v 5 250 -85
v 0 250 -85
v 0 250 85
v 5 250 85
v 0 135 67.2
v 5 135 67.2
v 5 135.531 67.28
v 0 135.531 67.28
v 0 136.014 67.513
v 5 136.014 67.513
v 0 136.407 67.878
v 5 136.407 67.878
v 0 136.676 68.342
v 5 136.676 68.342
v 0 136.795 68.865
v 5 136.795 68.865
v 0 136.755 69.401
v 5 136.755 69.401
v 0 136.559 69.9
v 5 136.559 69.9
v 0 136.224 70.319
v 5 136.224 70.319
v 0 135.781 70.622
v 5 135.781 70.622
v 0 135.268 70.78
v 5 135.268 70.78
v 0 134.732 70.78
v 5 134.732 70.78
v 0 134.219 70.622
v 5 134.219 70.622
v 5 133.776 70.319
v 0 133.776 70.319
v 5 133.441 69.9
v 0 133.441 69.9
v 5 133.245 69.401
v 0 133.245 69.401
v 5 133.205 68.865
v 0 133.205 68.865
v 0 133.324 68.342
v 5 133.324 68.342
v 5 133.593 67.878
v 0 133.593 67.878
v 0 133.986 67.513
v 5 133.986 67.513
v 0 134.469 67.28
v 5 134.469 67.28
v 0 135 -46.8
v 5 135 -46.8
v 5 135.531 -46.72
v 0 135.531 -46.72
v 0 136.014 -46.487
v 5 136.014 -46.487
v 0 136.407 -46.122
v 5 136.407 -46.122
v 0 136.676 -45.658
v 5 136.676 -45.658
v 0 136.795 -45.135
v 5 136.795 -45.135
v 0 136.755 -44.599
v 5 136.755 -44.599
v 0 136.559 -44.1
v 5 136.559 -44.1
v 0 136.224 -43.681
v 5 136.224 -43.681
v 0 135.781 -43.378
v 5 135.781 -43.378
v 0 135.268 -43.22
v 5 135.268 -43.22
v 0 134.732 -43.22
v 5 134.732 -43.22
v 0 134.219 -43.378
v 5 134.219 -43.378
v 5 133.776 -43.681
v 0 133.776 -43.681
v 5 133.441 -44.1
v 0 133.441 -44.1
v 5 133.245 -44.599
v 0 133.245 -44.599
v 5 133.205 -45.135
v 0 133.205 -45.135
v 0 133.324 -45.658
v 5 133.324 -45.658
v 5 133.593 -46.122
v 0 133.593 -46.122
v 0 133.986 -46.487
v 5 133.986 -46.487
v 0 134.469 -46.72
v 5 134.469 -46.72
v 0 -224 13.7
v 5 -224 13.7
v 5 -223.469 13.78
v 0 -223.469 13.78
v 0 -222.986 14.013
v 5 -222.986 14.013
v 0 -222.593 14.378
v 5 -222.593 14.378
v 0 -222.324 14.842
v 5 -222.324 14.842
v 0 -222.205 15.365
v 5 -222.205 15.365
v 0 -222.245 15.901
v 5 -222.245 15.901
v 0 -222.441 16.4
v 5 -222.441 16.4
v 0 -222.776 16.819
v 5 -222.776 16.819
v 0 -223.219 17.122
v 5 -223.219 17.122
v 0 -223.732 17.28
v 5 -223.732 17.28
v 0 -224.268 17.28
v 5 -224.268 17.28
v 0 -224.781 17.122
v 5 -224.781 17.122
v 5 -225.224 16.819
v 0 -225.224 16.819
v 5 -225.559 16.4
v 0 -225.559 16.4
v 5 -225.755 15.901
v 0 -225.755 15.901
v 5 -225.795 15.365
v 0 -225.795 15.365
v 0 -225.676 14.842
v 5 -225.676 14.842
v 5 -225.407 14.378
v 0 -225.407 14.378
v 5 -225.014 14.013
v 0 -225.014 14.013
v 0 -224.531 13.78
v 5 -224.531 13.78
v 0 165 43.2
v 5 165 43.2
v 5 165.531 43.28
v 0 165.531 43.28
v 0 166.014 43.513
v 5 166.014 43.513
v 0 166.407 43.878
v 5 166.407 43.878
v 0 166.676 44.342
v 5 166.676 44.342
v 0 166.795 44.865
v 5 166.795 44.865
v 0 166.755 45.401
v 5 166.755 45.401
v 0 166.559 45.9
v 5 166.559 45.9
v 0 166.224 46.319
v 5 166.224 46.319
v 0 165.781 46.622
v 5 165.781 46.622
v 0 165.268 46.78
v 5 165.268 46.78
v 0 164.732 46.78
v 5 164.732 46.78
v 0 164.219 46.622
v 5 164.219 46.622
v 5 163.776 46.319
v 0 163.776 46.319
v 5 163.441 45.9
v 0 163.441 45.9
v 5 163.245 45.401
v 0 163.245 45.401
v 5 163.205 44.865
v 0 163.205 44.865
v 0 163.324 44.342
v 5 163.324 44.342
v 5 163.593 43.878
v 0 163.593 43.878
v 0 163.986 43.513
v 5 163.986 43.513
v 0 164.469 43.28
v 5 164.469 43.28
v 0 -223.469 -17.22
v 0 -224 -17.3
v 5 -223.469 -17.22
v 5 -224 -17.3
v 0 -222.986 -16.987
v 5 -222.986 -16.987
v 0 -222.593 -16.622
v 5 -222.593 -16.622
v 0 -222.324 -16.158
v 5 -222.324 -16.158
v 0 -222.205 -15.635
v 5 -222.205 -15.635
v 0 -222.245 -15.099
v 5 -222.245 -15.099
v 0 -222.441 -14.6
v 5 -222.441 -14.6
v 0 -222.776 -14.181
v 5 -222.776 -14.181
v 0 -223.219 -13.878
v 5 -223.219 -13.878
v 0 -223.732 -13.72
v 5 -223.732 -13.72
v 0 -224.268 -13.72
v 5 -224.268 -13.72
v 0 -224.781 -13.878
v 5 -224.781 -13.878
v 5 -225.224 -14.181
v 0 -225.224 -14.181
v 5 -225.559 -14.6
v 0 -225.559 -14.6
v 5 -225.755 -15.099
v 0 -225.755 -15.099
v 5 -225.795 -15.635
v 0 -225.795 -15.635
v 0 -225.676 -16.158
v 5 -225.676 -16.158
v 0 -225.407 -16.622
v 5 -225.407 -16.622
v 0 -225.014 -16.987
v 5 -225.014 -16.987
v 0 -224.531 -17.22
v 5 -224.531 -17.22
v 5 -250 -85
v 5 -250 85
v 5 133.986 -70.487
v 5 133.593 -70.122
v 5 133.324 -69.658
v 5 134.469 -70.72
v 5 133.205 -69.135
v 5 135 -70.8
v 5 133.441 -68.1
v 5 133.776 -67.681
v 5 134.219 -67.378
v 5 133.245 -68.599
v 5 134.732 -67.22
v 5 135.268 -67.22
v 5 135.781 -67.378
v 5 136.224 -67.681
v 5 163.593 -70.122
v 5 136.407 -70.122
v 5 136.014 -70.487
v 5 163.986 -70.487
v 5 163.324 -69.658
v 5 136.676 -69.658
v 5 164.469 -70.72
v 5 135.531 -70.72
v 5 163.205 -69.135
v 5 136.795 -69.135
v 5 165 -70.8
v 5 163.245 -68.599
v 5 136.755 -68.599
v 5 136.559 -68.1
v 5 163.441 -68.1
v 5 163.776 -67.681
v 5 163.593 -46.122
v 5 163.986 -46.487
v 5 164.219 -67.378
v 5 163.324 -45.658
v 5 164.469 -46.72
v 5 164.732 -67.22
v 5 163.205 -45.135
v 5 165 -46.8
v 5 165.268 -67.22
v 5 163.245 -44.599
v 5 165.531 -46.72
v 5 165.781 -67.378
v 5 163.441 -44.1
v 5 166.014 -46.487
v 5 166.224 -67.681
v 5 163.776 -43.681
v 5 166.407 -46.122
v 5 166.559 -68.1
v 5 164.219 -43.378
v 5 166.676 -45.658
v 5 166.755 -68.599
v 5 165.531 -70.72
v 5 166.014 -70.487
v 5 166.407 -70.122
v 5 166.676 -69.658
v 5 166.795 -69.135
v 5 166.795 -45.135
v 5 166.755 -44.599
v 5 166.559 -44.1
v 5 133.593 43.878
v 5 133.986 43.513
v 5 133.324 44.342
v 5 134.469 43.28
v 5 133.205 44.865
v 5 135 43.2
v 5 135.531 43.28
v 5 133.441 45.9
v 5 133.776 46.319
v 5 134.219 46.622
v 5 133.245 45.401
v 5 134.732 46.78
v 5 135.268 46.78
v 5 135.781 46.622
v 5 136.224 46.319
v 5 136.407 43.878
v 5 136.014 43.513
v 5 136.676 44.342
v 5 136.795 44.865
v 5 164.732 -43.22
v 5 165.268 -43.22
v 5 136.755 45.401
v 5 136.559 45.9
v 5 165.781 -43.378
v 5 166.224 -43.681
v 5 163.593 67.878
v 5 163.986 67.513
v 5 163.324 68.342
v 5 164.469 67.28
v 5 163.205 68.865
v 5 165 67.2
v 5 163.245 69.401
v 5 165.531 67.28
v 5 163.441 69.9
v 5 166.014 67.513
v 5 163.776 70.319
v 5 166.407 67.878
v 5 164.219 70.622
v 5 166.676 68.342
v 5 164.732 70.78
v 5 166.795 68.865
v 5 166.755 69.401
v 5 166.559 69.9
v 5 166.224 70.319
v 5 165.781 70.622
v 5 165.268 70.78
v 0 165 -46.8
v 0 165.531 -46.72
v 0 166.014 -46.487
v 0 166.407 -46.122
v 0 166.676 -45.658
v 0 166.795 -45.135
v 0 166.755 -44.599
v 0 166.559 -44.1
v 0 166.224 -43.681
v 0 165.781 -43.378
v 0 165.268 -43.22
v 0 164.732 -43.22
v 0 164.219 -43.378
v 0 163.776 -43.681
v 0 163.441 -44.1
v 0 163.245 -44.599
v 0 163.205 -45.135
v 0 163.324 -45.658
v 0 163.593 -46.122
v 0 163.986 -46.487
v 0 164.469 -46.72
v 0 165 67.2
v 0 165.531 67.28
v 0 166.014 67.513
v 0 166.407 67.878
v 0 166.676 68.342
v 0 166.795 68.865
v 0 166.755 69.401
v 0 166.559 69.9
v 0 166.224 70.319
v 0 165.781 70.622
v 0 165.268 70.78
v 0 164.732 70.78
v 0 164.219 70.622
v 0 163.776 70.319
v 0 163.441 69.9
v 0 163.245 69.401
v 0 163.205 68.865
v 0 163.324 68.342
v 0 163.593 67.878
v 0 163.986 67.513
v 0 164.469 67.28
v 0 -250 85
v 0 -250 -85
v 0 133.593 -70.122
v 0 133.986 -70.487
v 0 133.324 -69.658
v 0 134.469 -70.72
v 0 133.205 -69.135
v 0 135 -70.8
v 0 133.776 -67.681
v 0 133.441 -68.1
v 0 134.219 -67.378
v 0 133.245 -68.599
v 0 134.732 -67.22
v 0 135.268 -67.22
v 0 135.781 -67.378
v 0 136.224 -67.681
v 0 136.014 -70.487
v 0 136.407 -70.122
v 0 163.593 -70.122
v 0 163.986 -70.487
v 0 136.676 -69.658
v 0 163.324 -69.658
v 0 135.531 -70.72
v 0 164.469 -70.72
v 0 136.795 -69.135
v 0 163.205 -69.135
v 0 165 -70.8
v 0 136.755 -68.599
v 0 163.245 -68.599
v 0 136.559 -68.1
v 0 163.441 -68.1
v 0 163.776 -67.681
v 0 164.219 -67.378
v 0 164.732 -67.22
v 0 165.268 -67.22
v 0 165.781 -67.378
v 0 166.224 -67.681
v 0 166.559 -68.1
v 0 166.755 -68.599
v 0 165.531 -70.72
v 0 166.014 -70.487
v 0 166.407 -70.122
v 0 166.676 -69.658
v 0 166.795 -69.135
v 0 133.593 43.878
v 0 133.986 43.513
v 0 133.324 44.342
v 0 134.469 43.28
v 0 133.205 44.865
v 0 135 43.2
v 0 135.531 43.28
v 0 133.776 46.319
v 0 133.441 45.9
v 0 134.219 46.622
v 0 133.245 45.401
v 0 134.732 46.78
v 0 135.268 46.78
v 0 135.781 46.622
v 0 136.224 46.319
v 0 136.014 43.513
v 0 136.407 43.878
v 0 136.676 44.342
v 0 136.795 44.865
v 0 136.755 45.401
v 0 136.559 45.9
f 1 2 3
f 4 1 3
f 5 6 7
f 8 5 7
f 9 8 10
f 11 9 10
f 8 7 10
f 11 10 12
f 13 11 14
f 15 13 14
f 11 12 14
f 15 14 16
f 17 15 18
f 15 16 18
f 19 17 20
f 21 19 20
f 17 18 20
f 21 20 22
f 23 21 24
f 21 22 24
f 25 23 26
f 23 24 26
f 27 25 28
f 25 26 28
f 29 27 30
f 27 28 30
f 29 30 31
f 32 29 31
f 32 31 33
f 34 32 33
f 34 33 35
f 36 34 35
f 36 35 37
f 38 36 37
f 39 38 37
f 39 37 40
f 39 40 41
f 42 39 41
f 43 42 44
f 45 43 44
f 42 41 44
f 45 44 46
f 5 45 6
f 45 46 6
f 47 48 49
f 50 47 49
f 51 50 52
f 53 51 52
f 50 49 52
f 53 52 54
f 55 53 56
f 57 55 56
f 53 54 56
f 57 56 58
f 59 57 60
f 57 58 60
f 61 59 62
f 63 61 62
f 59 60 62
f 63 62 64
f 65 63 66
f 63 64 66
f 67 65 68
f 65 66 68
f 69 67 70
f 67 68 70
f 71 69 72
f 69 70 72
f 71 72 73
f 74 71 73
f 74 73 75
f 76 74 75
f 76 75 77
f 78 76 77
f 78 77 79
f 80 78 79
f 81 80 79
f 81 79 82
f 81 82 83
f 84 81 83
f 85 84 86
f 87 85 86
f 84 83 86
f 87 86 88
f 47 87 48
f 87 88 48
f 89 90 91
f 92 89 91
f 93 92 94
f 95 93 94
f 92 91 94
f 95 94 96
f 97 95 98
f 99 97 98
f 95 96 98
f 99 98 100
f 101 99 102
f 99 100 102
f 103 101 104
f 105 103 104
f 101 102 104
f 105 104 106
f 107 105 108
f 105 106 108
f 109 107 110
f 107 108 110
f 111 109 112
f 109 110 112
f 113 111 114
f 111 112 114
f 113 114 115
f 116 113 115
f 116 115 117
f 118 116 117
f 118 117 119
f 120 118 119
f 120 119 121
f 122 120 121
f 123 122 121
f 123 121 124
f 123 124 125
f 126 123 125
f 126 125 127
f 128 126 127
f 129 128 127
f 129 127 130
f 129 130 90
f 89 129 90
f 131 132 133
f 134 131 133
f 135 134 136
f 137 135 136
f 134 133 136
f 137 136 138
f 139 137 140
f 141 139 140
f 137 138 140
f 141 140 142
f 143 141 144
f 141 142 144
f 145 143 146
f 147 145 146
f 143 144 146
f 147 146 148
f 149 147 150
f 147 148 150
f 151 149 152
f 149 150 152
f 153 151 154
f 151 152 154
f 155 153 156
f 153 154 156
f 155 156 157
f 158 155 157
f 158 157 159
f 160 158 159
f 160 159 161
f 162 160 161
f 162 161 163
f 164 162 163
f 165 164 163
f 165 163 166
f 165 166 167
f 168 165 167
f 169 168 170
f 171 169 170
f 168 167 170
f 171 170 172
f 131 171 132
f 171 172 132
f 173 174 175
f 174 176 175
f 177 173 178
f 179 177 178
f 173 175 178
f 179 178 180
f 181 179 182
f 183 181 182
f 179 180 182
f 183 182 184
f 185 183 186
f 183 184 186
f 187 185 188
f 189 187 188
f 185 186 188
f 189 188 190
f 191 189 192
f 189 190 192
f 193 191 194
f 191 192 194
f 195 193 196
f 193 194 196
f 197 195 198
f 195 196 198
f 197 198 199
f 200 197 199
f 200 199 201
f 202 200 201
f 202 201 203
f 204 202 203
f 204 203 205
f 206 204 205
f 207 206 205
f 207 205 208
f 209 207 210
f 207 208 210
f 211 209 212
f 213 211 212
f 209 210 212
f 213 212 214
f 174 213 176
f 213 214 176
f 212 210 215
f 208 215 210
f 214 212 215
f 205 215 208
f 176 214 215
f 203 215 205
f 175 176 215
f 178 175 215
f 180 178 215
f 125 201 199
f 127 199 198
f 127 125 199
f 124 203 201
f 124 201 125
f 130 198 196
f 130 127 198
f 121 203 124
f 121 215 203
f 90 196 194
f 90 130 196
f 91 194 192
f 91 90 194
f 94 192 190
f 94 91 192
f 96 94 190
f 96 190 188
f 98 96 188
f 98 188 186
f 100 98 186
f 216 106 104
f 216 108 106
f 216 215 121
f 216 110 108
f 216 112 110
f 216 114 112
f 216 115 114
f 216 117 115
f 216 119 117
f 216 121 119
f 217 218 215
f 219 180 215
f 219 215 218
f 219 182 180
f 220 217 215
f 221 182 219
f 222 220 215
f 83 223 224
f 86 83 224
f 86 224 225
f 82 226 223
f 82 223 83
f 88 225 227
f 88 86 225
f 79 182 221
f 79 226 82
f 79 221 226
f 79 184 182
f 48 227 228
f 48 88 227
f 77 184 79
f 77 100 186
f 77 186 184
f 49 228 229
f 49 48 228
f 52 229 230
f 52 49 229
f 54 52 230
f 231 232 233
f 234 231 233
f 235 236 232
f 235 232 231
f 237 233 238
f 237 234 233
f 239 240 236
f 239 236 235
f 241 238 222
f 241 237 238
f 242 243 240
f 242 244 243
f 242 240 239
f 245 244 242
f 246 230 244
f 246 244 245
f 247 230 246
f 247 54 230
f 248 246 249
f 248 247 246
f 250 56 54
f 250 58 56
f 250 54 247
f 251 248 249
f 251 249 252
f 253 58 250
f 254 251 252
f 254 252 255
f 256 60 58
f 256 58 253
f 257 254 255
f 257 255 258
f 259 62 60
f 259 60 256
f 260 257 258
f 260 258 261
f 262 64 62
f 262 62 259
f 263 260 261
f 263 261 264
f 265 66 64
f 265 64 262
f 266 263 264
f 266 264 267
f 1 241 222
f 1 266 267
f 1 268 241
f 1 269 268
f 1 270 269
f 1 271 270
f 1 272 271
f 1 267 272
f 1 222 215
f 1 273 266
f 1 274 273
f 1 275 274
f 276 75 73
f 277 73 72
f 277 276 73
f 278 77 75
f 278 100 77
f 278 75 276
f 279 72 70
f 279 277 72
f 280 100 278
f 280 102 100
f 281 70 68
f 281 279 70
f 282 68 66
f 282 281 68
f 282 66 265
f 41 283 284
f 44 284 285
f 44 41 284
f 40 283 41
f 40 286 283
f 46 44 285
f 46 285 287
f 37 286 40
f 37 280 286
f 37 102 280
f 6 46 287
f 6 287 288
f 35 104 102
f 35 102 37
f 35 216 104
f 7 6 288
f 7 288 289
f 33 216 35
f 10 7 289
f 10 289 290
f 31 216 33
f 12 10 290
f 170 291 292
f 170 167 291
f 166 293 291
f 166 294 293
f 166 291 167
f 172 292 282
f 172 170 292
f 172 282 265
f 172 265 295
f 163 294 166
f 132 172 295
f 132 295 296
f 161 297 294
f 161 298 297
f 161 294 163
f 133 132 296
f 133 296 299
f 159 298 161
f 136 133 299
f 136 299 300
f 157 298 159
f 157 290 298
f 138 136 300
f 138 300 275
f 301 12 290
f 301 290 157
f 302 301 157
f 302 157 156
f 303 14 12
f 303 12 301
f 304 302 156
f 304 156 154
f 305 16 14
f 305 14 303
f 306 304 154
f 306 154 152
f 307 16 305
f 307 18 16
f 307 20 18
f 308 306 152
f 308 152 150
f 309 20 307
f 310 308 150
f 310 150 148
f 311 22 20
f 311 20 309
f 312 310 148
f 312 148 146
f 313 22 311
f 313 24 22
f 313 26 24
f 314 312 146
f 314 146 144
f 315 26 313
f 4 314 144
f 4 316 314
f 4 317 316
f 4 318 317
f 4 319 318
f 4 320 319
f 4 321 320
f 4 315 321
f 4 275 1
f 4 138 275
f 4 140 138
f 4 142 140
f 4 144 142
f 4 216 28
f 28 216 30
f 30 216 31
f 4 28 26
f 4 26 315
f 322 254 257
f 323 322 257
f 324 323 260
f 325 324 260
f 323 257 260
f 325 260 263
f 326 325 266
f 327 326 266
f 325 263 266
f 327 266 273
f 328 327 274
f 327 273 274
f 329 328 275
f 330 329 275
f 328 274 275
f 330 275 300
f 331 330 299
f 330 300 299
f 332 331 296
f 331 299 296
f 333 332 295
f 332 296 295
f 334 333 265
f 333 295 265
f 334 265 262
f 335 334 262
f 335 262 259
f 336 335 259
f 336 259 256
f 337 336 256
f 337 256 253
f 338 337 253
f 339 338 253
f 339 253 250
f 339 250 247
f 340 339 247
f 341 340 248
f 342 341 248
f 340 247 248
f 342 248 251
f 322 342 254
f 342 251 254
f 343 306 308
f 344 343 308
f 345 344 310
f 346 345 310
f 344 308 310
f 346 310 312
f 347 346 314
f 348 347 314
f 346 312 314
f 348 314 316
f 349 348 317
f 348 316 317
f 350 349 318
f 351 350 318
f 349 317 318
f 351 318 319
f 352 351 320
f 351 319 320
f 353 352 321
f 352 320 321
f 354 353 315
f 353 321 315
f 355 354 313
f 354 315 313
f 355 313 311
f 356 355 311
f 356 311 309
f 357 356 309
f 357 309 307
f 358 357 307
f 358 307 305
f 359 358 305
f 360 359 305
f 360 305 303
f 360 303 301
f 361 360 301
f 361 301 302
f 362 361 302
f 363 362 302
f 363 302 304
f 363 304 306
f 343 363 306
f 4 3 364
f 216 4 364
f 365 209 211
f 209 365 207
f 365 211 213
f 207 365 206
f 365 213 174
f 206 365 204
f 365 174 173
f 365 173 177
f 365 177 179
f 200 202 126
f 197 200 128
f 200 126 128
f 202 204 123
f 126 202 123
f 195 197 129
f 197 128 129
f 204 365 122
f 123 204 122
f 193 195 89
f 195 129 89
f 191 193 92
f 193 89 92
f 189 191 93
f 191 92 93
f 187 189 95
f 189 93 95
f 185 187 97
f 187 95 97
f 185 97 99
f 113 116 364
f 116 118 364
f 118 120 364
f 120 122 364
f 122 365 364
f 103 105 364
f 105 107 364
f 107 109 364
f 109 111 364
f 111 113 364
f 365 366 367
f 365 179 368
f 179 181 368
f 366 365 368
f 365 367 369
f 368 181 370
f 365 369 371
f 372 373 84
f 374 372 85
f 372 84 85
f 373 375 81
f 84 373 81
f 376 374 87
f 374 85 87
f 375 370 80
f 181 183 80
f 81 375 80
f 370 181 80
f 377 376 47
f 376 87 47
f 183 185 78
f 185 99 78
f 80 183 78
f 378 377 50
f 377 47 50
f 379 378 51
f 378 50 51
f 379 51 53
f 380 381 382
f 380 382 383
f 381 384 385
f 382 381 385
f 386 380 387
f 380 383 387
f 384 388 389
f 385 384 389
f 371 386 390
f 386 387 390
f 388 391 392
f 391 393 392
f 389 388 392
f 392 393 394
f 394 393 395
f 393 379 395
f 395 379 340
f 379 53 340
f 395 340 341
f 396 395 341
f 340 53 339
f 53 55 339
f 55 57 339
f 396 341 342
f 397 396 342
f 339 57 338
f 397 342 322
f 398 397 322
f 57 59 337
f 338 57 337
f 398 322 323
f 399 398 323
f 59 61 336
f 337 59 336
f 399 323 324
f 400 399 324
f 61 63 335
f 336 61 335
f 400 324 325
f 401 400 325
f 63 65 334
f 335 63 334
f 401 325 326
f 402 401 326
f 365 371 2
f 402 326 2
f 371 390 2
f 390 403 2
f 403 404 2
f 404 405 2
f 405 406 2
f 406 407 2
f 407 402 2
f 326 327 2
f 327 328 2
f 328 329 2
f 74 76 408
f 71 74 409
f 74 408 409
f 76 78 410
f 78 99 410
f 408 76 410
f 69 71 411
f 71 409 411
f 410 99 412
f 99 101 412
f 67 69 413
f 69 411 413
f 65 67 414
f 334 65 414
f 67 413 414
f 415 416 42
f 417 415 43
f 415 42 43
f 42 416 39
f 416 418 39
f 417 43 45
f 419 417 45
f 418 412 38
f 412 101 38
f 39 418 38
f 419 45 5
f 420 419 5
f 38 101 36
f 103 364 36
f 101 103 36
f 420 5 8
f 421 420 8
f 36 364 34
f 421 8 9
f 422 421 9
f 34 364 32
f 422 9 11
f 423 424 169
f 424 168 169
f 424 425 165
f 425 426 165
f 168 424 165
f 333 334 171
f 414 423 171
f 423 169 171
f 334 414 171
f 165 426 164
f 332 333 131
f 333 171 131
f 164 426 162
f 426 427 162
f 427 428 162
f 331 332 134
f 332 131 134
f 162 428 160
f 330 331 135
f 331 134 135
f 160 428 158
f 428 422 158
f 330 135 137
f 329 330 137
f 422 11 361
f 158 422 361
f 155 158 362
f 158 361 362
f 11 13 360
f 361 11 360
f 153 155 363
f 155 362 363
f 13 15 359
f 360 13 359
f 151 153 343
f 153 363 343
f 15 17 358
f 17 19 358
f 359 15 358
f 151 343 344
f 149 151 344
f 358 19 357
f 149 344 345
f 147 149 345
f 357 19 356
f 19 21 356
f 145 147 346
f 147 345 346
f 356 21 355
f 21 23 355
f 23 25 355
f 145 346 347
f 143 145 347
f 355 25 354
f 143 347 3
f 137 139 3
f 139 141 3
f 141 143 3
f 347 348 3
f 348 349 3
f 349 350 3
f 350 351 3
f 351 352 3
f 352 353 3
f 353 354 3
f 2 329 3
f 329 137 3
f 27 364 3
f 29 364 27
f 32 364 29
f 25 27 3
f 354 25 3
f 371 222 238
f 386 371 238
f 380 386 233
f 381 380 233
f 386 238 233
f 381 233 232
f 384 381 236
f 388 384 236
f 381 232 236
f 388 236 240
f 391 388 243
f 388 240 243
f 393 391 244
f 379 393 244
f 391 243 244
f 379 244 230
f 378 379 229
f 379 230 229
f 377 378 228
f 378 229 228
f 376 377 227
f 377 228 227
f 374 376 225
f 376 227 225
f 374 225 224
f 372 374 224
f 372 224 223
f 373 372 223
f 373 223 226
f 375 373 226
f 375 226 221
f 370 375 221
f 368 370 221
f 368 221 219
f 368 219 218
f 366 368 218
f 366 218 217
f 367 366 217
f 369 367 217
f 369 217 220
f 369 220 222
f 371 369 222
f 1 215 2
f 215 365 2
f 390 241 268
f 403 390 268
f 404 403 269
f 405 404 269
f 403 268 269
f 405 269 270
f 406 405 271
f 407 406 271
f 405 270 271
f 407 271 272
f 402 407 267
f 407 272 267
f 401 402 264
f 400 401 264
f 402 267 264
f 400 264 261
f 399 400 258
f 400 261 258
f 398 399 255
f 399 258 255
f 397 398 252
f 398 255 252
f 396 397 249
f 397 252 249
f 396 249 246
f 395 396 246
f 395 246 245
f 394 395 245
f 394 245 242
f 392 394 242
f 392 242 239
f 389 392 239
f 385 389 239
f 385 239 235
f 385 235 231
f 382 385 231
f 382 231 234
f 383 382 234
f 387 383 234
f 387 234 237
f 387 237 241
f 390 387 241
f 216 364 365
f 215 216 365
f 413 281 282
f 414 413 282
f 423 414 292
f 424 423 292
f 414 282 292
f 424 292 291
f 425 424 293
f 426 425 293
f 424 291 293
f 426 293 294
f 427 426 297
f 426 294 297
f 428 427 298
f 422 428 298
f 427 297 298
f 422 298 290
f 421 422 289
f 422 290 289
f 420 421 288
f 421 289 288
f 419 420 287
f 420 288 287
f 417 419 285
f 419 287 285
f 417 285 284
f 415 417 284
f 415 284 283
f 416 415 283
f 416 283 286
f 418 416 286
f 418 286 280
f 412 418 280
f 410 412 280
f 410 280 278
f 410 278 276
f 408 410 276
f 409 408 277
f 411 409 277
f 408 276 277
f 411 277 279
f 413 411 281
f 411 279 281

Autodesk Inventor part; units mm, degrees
ref_plane "YZ Plane" through (0, 0, 0) normal (1, 0, 0) x (0, 1, 0)
ref_plane "XZ Plane" through (0, 0, 0) normal (0, 1, 0) x (-1, 0, 0)
ref_plane "XY Plane" through (0, 0, 0) normal (0, 0, 1) x (1, 0, 0)
sketch "草图8" plane through (0, 0, 0) normal (1, 0, 0) x (0, 1, 0)
  line L0 (250, 85) -> (-250, 85)
  line L1 (-250, 85) -> (-250, -85)
  line L2 (-250, -85) -> (250, -85)
  line L3 (250, -85) -> (250, 85)
  point P0 (0, 0)
  dimension "d22" = 500
  dimension "d23" = 170
extrude "拉伸8" add sketch "草图8" along normal blind 5
sketch "草图9" plane through (5, 0, 0) normal (1, 0, 0) x (0, 0, -1)
  circle A0 centre (15.5, -224) radius 1.8
  point P0 (0, 0)
  dimension "d26" = 3.6
extrude "拉伸9" cut sketch "草图9" against normal through all
sketch "草图10" plane through (5, 0, 0) normal (1, 0, 0) x (0, 0, -1)
  circle A0 centre (-15.5, -224) radius 1.8
  point P0 (0, 0)
  dimension "d29" = 3.6
extrude "拉伸10" cut sketch "草图10" against normal through all
sketch "草图11" plane through (5, 0, 0) normal (1, 0, 0) x (0, 0, -1)
  circle A0 centre (-69, 165) radius 1.8
  point P0 (0, 0)
  dimension "d32" = 3.6
extrude "拉伸11" cut sketch "草图11" against normal through all
sketch "草图12" plane through (5, 0, 0) normal (1, 0, 0) x (0, 0, -1)
  circle A0 centre (69, 165) radius 1.8
  point P0 (0, 0)
  dimension "d35" = 3.6
extrude "拉伸12" cut sketch "草图12" against normal through all
sketch "草图13" plane through (5, 0, 0) normal (1, 0, 0) x (0, 0, -1)
  circle A0 centre (-45, 165) radius 1.8
  point P0 (0, 0)
  dimension "d38" = 3.6
extrude "拉伸13" cut sketch "草图13" against normal through all
sketch "草图14" plane through (5, 0, 0) normal (1, 0, 0) x (0, 0, -1)
  circle A0 centre (45, 165) radius 1.8
  point P0 (0, 0)
  dimension "d41" = 3.6
extrude "拉伸14" cut sketch "草图14" against normal through all
sketch "草图15" plane through (5, 0, 0) normal (1, 0, 0) x (0, 0, -1)
  circle A0 centre (-69, 135) radius 1.8
  point P0 (0, 0)
  dimension "d44" = 3.6
extrude "拉伸15" cut sketch "草图15" against normal through all
sketch "草图16" plane through (5, 0, 0) normal (1, 0, 0) x (0, 0, -1)
  circle A0 centre (-45, 135) radius 1.8
  point P0 (0, 0)
  dimension "d47" = 3.6
extrude "拉伸16" cut sketch "草图16" against normal through all
sketch "草图17" plane through (5, 0, 0) normal (1, 0, 0) x (0, 0, -1)
  circle A0 centre (45, 135) radius 1.8
  point P0 (0, 0)
  dimension "d50" = 3.6
extrude "拉伸17" cut sketch "草图17" against normal through all
sketch "草图18" plane through (5, 0, 0) normal (1, 0, 0) x (0, 0, -1)
  circle A0 centre (69, 135) radius 1.8
  point P0 (0, 0)
  dimension "d53" = 3.6
extrude "拉伸18" cut sketch "草图18" against normal through all
sketch "草图19" plane through (5, 0, 0) normal (1, 0, 0) x (0, 0, -1)
  point P0 (0, 0)
equation "\"折弯半径\" = 厚度"
equation "\"折弯释压宽度\" = 厚度"
equation "\"折弯释压深度\" = 0.5 * 厚度"
equation "\"拐角释压尺寸\" = 4 * 厚度"
equation "\"最小余量\" = 2 * 厚度"
equation "\"过渡半径\" = 折弯半径"
equation "\"Jacobi半径尺寸\" = 折弯半径"
equation "\"间隙大小\" = 厚度"
equation "\"厚度\" = 0.5"
properties part number "内层17cm板"
